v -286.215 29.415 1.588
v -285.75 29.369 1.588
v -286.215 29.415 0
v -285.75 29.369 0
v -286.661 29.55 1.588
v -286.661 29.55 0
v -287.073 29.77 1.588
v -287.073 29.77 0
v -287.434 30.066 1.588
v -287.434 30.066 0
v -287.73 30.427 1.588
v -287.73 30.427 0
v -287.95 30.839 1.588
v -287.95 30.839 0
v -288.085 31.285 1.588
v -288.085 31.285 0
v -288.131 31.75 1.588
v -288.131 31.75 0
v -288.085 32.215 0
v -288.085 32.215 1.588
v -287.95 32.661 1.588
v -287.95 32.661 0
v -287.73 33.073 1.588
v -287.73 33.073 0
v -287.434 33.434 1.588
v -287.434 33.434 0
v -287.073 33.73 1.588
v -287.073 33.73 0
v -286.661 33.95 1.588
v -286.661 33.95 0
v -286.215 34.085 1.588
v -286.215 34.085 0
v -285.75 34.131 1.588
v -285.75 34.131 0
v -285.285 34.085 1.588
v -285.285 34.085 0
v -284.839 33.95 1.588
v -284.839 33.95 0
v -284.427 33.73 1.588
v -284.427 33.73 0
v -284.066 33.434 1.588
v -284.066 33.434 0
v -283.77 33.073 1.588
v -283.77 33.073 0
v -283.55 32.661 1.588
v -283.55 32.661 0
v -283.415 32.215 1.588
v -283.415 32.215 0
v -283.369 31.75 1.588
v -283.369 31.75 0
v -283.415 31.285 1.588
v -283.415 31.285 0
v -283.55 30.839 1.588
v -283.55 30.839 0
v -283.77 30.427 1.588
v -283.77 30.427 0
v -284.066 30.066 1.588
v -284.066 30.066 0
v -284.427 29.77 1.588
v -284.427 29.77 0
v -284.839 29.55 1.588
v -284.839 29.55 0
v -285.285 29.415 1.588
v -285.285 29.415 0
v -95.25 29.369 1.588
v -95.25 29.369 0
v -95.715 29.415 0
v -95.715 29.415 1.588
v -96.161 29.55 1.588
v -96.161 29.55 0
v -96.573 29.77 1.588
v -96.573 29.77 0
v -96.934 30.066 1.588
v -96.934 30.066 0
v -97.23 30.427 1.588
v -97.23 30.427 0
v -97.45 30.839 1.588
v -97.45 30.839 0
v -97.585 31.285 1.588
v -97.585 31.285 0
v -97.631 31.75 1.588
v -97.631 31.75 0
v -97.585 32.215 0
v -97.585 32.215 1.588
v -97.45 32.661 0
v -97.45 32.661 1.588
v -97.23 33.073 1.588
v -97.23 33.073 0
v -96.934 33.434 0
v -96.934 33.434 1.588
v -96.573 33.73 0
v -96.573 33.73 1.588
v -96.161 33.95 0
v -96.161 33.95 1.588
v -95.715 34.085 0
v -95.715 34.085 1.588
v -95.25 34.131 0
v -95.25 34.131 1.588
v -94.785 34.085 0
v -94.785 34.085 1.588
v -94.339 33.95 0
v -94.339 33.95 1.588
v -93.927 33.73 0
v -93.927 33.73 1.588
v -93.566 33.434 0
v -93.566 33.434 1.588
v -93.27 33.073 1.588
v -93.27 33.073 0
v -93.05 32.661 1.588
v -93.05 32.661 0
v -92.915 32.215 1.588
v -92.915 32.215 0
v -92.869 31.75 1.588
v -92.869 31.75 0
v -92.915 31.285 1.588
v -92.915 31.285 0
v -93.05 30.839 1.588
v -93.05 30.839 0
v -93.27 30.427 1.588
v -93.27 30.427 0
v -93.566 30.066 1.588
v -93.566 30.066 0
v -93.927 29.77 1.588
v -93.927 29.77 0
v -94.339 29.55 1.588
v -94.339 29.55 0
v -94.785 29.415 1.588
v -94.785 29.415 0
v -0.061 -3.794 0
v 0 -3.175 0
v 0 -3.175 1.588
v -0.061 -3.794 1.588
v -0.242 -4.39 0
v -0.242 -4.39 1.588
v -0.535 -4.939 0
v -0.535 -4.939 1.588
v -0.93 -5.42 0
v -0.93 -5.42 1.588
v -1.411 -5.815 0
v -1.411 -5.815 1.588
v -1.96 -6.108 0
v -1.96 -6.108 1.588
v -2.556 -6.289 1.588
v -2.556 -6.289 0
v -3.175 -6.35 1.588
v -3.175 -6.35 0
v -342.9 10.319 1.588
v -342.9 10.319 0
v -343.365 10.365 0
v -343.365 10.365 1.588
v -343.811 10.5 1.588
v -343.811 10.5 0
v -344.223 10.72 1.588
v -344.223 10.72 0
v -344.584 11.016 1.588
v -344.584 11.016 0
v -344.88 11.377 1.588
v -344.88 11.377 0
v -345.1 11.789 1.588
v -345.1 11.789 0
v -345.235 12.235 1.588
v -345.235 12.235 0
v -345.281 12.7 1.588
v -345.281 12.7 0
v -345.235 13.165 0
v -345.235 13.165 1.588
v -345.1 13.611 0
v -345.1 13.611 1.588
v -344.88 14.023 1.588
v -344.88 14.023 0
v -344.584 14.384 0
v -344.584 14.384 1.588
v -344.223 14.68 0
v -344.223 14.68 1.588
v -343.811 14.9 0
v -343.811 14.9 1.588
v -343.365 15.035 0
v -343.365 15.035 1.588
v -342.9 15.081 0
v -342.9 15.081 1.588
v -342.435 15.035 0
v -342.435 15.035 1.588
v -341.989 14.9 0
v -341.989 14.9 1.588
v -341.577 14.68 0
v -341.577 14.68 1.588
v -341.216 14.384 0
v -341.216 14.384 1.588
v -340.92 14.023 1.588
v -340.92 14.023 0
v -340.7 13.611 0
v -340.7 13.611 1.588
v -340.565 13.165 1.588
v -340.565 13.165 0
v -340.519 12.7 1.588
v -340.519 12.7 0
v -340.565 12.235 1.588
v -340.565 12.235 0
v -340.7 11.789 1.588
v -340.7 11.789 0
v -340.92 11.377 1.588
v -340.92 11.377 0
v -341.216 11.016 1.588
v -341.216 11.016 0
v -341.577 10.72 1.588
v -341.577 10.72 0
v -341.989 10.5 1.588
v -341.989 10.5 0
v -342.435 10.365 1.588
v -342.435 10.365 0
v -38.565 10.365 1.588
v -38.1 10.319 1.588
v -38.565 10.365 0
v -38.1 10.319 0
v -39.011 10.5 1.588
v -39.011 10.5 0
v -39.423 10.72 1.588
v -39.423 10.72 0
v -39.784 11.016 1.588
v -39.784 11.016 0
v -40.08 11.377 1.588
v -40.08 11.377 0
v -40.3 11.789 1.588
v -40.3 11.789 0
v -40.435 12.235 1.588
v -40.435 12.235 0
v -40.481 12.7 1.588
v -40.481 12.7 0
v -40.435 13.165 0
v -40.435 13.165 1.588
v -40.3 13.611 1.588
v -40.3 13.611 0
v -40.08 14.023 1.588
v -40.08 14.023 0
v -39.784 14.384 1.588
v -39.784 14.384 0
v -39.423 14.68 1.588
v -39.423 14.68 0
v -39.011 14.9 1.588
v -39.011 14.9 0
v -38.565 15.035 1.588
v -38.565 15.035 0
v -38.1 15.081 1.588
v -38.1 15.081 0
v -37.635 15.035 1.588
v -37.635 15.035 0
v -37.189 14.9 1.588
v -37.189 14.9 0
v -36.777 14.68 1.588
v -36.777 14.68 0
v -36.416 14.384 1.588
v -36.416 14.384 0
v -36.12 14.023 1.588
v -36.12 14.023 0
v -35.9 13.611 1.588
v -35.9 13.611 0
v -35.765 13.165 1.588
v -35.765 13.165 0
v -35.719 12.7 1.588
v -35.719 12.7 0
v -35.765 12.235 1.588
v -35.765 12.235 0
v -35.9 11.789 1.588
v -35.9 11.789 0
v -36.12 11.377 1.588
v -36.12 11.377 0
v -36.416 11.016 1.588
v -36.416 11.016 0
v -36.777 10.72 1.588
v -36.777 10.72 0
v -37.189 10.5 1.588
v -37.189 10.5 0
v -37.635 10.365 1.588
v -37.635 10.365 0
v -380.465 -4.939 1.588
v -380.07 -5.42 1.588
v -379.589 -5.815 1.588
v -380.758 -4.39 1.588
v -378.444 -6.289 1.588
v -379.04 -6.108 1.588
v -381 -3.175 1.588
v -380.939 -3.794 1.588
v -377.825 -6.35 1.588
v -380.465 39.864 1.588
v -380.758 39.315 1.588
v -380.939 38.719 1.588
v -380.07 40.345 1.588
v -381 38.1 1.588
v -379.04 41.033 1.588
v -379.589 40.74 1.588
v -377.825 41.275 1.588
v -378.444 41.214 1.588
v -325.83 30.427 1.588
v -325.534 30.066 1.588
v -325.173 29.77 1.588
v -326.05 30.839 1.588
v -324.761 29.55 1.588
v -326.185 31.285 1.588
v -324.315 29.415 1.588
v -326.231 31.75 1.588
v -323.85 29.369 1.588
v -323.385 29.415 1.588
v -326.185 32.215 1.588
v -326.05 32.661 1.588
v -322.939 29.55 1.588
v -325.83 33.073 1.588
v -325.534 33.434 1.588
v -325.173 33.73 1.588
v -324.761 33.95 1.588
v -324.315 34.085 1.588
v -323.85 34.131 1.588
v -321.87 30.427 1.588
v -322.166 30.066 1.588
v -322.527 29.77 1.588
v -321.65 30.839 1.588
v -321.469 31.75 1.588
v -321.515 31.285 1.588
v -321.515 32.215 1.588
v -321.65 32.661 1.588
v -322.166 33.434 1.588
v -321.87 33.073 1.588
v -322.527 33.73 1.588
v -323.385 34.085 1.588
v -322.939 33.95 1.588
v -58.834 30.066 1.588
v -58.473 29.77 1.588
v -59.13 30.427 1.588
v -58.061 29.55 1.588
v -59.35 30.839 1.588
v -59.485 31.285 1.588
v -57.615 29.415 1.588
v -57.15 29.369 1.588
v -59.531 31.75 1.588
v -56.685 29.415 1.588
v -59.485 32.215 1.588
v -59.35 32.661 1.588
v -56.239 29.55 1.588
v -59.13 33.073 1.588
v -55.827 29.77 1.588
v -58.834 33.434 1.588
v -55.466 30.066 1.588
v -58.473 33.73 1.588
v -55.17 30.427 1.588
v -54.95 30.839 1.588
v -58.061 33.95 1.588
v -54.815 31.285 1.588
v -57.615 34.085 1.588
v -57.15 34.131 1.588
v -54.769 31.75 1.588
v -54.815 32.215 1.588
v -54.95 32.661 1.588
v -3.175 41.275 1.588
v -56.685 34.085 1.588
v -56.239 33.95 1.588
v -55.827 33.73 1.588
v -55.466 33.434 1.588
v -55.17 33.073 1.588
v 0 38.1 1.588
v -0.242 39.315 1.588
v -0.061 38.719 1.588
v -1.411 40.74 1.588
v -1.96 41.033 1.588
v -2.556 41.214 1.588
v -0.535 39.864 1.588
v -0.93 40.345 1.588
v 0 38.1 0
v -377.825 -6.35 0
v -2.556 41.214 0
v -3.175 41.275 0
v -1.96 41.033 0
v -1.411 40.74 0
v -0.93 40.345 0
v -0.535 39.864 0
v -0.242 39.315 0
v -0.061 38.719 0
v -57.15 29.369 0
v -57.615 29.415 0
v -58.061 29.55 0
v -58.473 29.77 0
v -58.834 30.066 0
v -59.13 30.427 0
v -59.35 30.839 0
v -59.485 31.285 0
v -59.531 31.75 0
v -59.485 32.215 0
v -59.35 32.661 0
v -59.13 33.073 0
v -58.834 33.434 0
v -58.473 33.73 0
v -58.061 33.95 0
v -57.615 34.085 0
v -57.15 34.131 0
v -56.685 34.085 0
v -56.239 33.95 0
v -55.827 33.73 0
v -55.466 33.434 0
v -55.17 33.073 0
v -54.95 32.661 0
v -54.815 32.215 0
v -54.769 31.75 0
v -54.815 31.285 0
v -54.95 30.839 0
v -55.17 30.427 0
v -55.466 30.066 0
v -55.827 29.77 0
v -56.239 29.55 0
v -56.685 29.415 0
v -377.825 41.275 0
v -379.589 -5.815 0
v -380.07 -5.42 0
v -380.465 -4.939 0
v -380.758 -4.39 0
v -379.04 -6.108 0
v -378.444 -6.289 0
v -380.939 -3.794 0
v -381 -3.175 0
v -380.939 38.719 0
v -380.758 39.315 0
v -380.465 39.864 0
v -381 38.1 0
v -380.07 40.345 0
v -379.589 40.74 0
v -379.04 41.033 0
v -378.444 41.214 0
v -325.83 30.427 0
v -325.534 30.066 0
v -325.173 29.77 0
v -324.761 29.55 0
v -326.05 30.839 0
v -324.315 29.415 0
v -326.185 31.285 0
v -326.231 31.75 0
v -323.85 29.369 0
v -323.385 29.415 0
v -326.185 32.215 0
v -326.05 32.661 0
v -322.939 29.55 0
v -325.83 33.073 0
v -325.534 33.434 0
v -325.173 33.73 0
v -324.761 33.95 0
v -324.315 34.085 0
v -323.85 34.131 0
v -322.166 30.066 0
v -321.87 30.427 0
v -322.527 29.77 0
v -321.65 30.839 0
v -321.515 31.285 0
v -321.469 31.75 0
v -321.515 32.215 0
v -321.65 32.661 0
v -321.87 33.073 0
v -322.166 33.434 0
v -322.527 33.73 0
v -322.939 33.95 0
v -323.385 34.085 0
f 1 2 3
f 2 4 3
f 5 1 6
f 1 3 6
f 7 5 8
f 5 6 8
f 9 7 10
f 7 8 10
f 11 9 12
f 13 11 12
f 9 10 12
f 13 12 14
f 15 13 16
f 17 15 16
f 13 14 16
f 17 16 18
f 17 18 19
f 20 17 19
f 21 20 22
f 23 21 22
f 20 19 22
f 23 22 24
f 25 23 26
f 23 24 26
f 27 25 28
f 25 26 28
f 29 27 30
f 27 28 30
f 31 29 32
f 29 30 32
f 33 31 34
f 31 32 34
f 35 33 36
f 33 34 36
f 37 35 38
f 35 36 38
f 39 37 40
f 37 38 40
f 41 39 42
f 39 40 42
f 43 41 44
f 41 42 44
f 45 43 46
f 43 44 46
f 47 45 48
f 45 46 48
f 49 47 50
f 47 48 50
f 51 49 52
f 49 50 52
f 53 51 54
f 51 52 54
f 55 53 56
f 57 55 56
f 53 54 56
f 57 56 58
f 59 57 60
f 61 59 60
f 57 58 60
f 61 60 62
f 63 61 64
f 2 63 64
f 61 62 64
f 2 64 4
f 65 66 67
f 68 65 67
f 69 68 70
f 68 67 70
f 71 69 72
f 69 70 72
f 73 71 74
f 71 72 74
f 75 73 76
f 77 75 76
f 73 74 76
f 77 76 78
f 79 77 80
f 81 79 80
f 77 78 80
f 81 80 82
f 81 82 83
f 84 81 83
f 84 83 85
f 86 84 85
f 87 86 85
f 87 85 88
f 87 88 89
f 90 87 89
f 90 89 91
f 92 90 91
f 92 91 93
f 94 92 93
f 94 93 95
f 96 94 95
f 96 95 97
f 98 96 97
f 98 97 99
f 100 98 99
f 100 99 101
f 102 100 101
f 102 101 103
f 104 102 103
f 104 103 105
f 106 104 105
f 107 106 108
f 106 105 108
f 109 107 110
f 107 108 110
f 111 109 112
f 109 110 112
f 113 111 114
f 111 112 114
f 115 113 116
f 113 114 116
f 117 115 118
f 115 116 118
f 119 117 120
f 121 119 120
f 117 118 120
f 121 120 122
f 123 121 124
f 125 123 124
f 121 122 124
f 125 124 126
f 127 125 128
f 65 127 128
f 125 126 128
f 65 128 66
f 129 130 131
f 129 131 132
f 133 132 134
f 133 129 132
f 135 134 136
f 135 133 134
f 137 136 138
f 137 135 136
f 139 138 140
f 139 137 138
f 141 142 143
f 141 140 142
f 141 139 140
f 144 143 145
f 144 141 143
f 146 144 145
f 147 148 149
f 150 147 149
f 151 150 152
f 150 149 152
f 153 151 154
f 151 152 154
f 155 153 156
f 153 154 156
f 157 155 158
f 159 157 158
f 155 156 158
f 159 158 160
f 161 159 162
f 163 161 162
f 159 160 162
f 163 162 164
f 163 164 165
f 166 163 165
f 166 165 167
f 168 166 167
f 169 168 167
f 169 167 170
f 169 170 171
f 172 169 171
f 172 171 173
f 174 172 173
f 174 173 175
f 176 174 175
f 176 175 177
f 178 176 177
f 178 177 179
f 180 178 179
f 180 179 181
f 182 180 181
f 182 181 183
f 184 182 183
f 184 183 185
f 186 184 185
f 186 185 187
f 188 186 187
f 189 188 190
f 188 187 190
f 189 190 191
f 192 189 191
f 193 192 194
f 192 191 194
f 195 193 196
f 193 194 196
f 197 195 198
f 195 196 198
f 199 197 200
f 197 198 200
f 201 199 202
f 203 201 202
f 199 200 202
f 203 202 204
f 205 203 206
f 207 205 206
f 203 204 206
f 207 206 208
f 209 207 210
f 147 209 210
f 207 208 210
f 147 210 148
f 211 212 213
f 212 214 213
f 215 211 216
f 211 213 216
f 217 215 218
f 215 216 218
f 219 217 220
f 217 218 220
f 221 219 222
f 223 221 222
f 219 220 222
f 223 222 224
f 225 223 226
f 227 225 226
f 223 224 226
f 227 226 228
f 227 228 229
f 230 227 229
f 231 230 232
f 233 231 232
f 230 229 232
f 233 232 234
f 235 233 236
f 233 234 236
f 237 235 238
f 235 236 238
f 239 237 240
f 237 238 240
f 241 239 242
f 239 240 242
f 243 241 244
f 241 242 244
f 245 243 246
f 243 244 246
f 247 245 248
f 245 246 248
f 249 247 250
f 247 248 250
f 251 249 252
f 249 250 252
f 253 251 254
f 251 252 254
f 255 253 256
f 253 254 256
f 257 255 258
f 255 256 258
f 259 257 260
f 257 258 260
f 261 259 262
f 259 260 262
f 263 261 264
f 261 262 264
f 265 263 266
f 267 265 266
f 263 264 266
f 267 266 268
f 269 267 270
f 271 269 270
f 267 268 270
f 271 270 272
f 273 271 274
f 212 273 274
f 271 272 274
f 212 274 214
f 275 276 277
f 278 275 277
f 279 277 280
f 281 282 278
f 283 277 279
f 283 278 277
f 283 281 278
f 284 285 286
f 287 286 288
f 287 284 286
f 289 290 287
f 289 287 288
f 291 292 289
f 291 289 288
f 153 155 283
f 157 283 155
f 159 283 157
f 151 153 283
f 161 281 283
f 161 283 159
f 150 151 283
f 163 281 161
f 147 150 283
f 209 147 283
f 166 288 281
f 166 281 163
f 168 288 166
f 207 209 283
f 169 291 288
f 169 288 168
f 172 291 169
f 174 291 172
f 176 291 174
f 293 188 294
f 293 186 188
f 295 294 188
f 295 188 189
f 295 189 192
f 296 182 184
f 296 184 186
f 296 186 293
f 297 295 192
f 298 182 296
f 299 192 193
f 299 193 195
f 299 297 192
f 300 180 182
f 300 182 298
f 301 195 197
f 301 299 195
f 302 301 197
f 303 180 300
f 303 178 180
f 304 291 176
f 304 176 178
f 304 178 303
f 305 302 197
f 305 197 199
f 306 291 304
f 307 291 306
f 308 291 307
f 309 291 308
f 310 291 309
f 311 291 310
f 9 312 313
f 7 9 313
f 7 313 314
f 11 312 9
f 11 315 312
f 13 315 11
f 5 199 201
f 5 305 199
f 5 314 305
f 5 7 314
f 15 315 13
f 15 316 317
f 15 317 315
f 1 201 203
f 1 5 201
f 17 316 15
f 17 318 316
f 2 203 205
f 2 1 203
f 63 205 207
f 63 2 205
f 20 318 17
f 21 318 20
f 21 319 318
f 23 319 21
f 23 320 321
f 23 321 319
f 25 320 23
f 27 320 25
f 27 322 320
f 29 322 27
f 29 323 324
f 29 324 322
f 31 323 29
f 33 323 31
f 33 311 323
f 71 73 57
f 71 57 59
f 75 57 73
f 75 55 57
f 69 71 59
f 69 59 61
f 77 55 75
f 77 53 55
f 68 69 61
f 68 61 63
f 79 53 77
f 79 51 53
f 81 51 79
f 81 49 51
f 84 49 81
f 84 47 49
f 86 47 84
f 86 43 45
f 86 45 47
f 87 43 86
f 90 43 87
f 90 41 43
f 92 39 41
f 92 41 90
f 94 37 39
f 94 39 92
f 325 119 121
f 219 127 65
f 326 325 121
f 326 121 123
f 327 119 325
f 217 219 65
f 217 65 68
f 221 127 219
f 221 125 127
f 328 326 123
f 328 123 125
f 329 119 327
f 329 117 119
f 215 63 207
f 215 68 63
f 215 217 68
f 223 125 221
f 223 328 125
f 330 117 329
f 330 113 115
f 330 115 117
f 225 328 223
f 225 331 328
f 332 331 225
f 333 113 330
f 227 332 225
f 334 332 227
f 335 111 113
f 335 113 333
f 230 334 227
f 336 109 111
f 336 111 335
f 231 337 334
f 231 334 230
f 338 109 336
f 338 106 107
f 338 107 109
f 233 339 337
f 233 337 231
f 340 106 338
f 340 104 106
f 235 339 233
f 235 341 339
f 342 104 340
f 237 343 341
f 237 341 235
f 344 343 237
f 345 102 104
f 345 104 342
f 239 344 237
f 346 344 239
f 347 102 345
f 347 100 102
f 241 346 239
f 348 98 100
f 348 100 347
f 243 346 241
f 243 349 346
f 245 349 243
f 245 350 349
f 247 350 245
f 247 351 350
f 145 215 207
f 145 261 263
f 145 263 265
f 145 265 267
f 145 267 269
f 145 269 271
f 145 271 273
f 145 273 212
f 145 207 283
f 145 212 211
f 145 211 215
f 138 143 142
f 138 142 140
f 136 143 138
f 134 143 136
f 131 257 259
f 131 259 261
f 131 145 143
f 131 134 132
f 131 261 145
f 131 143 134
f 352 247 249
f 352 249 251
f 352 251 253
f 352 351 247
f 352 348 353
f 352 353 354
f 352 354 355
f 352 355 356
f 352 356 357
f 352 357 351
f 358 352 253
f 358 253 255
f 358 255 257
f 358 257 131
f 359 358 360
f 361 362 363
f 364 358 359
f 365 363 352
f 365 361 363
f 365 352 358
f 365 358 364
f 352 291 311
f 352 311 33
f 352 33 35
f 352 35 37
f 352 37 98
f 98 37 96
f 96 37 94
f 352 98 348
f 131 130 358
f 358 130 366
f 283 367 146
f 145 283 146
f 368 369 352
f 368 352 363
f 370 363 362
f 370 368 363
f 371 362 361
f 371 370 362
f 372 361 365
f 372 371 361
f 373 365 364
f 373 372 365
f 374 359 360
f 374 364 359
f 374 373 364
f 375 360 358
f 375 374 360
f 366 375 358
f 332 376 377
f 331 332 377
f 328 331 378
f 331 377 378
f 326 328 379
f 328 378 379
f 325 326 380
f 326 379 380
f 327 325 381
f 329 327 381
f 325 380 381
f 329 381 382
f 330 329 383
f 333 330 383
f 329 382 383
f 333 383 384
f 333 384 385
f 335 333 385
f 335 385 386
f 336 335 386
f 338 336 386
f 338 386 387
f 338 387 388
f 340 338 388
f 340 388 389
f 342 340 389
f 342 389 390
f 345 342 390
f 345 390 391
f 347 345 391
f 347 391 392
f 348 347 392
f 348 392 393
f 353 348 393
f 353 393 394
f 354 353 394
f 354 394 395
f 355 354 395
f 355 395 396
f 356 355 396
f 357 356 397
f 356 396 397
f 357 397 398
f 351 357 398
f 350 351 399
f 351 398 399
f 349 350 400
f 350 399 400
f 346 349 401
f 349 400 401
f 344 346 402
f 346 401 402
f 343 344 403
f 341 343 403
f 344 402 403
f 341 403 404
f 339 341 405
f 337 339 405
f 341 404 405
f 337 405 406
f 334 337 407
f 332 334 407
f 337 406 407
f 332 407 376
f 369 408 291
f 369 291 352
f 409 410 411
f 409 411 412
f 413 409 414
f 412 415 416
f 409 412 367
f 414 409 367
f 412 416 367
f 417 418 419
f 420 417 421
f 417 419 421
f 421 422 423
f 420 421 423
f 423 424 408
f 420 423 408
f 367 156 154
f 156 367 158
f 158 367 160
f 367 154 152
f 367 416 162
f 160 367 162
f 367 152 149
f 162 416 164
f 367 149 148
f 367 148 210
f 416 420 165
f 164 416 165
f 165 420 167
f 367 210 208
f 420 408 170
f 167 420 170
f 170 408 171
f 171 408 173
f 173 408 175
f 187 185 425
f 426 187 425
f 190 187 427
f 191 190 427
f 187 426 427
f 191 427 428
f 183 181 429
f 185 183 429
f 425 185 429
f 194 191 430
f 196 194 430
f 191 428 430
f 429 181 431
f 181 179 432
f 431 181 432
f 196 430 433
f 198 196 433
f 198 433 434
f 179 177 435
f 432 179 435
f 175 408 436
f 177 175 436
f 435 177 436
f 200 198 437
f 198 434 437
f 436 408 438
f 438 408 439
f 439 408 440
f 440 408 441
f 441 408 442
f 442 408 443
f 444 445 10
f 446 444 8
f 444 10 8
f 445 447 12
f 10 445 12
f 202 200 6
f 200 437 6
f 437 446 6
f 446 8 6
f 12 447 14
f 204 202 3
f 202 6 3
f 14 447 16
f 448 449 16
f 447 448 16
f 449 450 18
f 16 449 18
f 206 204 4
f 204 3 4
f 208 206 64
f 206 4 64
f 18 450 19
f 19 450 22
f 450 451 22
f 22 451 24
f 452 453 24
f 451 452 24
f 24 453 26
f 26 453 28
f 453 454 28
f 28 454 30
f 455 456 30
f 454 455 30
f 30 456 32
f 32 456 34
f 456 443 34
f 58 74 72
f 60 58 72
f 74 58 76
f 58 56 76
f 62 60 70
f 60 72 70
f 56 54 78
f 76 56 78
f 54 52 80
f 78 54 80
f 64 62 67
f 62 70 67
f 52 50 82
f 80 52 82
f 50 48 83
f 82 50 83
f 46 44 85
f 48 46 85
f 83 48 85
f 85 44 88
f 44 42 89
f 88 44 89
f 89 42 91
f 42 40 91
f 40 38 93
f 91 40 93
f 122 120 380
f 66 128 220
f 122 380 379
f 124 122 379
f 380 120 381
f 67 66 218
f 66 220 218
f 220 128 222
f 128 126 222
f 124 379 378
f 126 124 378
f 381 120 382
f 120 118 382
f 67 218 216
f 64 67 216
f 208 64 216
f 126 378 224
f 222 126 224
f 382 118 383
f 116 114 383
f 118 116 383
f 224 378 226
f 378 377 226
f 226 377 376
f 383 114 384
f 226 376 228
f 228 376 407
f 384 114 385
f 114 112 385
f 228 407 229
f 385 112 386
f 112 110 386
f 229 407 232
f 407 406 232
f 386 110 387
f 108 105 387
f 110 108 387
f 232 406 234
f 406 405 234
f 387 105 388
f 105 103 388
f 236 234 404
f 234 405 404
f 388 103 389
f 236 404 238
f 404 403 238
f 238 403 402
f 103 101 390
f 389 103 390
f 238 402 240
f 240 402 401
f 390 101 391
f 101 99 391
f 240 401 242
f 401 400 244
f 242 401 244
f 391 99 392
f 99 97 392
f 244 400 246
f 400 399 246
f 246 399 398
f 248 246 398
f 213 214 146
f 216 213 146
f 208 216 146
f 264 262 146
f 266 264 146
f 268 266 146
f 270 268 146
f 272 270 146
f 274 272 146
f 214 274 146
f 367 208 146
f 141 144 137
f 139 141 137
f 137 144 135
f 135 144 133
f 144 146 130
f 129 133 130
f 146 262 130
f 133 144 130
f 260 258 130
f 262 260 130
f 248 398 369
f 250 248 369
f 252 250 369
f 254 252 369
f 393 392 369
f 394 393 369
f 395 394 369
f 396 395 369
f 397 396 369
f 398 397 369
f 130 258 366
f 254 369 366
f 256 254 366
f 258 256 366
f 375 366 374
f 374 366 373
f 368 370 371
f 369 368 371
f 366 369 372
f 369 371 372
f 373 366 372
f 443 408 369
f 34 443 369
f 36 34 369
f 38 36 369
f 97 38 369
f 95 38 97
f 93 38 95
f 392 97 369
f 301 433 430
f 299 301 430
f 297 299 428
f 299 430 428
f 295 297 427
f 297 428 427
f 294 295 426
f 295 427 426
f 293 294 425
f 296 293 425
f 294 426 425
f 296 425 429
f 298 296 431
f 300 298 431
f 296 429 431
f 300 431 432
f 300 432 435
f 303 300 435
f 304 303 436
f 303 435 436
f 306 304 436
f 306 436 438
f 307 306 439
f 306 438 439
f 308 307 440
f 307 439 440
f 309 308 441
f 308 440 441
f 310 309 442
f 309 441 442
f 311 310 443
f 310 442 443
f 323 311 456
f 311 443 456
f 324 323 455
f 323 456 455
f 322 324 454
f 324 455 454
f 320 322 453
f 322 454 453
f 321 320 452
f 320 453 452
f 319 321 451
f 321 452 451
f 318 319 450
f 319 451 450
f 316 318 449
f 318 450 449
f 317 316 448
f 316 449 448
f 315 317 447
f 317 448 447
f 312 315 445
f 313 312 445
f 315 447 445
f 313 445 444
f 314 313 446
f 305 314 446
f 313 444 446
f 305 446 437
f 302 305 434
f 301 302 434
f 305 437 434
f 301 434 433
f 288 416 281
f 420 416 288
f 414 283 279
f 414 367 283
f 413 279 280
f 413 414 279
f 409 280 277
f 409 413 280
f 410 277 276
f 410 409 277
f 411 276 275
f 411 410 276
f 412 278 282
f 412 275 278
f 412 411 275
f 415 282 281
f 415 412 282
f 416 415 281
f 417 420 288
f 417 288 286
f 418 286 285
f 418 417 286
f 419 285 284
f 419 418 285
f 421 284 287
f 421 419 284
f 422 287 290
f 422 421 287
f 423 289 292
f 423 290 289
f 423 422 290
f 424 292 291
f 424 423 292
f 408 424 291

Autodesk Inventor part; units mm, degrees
ref_plane "YZ Plane" through (0, 0, 0) normal (1, 0, 0) x (0, 1, 0)
ref_plane "XZ Plane" through (0, 0, 0) normal (0, 1, 0) x (-1, 0, 0)
ref_plane "XY Plane" through (0, 0, 0) normal (0, 0, 1) x (1, 0, 0)
sketch "Sketch1" plane through (0, 0, 0) normal (0, 0, 1) x (1, 0, 0)
  line L0 (-381, -3.175) -> (-381, 38.1)
  line L1 (-377.825, 50.8) -> (-3.175, 50.8)
  line L2 (0, 38.1) -> (0, 0)
  line L3 (-381, 0) -> (-381, -6.35)
  line L4 (-377.825, -6.35) -> (-3.175, -6.35)
  line L5 (0, -3.175) -> (0, 0)
  arc A0 (-381, -3.175) -> (-377.825, -6.35) centre (-377.825, -3.175) ccw
  arc A1 (-377.825, 50.8) -> (-381, 47.625) centre (-377.825, 47.625) ccw
  arc A2 (0, 47.625) -> (-3.175, 50.8) centre (-3.175, 47.625) ccw
  arc A3 (-3.175, -6.35) -> (0, -3.175) centre (-3.175, -3.175) ccw
  line L6 (-381, 50.8) -> (-381, 41.275)
  line L7 (-377.825, 41.275) -> (-3.175, 41.275)
  arc A4 (-377.825, 41.275) -> (-381, 38.1) centre (-377.825, 38.1) ccw
  arc A5 (0, 38.1) -> (-3.175, 41.275) centre (-3.175, 38.1) ccw
  point P0 (0, 50.8)
  point P1 (0, -6.35)
  point P2 (0, 41.275)
  dimension "d1" = 50.8
  dimension "d7" = 6.35
  dimension "d19" = 3.175
  dimension "d20" = 3.175
  dimension "d25" = 9.525
  dimension "d26" = 3.175
extrude "Extrusion1" add sketch "Sketch1" along normal blind 1.5875
sketch "Sketch2" plane through (0, 0, 1.5875) normal (0, 0, 1) x (1, 0, 0)
  line L0 (-381, 50.8) -> (-323.85, 50.8)
  line L1 (-323.85, 50.8) -> (-273.05, 50.8)
  line L2 (-381, 0) -> (-342.9, 0)
  line L3 (-323.85, 50.8) -> (-323.85, 31.75)
  line L4 (-190.5, 50.8) -> (-190.5, -6.35)
  line L5 (0, 50.8) -> (-57.15, 50.8)
  line L6 (-57.15, 50.8) -> (-107.95, 50.8)
  line L7 (0, 0) -> (-38.1, 0)
  line L8 (-57.15, 50.8) -> (-57.15, 31.75)
  line L9 (-273.05, 50.8) -> (-285.75, 50.8)
  line L10 (-3.175, 50.8) -> (-377.825, 50.8) projected
  line L11 (-285.75, 50.8) -> (-285.75, 31.75)
  line L12 (-107.95, 50.8) -> (-95.25, 50.8)
  line L13 (-95.25, 50.8) -> (-95.25, 31.75)
  line L14 (-38.1, 0) -> (-38.1, 12.7)
  line L15 (-342.9, 0) -> (-342.9, 12.7)
  line L16 (0, 50.8) -> (0, 41.275)
  line L17 (0, -3.175) -> (0, 47.625) projected
  line L18 (-381, 38.1) -> (-381, -3.175) projected
  line L19 (-381, 41.275) -> (0, 41.275)
  point P0 (-381, 47.625)
  dimension "d4" = 57.15
  dimension "d5" = 50.8
  dimension "d11" = 38.1
  dimension "d21" = 12.7
  dimension "d22" = 12.7
  dimension "d23" = 12.7
  dimension "d24" = 9.525
hole "Hole1" at (-323.85, 31.75, 1.5875) at (-57.15, 31.75, 1.5875) at (-285.75, 31.75, 1.5875) at (-95.25, 31.75, 1.5875) at (-342.9, 12.7, 1.5875) at (-38.1, 12.7, 1.5875) direction (0, 0, -1) diameter 4.7625 end through all
properties part number "wedge" material "Polycarbonate, Clear"
